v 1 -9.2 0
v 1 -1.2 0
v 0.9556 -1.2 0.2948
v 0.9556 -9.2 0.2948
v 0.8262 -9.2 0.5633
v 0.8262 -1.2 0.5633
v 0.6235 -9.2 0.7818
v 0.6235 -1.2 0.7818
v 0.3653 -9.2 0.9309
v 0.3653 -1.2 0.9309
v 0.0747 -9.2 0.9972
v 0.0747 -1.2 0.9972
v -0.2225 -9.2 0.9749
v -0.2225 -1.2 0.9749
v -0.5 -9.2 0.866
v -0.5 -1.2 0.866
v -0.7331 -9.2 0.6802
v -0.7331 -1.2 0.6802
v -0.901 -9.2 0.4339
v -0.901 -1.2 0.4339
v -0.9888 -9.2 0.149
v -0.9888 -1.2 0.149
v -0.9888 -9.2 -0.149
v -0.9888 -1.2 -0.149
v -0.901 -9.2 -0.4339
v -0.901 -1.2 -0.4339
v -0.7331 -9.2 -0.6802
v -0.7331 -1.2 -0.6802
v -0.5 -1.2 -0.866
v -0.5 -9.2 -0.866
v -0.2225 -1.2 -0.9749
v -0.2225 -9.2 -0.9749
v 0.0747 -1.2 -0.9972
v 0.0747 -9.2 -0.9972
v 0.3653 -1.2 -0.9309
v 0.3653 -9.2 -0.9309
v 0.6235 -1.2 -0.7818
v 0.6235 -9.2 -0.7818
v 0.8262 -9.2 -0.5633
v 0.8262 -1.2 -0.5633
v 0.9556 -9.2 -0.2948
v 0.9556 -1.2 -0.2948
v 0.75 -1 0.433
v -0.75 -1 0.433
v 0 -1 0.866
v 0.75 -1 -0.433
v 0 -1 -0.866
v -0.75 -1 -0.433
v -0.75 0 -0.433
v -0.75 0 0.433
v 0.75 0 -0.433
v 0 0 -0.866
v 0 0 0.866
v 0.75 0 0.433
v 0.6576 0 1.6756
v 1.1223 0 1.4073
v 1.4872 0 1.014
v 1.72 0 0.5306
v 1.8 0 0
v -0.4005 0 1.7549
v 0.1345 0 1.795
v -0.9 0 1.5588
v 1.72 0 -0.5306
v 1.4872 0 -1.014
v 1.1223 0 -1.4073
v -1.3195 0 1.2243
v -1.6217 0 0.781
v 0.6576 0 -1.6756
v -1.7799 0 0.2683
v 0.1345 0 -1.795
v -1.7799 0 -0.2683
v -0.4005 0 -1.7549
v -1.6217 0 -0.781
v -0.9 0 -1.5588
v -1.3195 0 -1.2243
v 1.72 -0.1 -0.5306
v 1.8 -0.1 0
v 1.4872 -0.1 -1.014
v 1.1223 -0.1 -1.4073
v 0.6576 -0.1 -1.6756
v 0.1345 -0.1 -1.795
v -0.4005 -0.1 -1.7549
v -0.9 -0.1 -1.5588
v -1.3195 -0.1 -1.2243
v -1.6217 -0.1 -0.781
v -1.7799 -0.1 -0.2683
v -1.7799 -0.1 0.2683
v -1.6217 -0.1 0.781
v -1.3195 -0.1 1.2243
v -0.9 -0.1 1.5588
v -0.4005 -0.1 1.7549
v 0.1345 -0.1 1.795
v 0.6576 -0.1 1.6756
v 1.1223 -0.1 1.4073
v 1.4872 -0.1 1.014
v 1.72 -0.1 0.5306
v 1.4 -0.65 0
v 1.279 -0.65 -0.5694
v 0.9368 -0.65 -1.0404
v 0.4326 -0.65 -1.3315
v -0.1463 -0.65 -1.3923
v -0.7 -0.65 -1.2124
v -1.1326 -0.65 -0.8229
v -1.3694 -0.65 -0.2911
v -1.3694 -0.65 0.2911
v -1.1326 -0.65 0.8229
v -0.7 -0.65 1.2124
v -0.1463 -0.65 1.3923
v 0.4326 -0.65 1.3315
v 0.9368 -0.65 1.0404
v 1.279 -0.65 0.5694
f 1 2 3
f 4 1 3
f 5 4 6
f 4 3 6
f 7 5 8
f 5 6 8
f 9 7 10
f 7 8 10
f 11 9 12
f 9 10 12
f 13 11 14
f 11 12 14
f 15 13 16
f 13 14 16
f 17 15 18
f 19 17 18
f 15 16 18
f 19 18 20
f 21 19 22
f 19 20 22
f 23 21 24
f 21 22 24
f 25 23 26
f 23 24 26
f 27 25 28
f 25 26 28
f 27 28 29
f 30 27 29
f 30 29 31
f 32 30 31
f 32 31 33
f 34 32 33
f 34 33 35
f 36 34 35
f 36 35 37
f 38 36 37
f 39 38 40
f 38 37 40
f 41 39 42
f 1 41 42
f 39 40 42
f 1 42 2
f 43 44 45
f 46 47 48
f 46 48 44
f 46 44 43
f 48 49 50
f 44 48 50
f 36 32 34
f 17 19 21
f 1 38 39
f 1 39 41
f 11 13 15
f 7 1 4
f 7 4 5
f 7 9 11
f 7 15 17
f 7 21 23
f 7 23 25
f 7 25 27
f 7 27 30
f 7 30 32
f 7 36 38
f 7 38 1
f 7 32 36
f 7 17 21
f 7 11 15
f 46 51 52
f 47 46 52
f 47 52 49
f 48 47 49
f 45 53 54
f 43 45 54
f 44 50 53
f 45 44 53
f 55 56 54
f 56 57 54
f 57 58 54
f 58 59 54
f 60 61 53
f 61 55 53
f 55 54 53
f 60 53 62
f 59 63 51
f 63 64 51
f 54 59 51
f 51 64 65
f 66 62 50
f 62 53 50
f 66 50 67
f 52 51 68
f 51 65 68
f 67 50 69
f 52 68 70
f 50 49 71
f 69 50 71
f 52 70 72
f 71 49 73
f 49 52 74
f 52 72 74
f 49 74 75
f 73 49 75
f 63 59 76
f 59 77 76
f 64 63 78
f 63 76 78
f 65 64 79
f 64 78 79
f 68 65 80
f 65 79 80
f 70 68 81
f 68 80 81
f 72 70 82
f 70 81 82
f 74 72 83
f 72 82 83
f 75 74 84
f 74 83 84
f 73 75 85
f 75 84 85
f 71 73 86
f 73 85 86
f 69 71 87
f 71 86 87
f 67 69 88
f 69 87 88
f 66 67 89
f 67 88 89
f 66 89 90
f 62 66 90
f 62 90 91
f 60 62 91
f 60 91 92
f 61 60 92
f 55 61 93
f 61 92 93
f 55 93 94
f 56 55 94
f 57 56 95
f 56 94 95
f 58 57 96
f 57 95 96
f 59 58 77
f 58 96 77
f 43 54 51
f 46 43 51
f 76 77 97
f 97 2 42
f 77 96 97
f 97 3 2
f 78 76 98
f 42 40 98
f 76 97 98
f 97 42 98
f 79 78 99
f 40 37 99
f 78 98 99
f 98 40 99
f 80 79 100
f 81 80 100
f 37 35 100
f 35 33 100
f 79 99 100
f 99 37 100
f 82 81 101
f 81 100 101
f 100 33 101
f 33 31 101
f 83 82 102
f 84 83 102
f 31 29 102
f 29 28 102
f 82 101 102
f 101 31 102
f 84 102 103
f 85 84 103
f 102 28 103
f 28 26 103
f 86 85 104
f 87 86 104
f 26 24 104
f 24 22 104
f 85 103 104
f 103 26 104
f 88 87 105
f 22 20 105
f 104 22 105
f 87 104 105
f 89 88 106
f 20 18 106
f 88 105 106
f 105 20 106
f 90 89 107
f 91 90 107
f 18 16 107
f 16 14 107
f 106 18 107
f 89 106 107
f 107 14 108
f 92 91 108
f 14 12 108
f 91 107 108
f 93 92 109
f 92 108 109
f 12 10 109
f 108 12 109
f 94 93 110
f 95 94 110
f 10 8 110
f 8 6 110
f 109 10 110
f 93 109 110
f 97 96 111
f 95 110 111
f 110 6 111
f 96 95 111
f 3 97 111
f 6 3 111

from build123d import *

# Parameters (mm, degrees)
CUT_EXTRUDE_1_DEPTH = 1
SKETCH_3_R          = 1
EXTRUDE_2_DEPTH     = 8


with BuildPart() as part:
    # 草图1 → 旋转1 (revolve)
    with BuildSketch(Plane.XY):
        Polygon((0, -1.2), (0, 0), (1.8, 0), (1.8, -0.1), (1, -1.2), align=None)
    revolve(axis=Axis((0, 0, 0), (0, 1, 0)))

    # 草图2 → 切除-拉伸1 (cut)
    with BuildSketch(Plane(origin=(0, 0, 0), x_dir=(1, 0, 0), z_dir=(0, 1, 0))):
        Polygon((0, -0.866025404), (0.75, -0.433012702), (0.75, 0.433012702), (0, 0.866025404), (-0.75, 0.433012702), (-0.75, -0.433012702), align=None)
    extrude(amount=-CUT_EXTRUDE_1_DEPTH, mode=Mode.SUBTRACT)

    # 草图3 → 凸台-拉伸2 (add)
    with BuildSketch(Plane.XZ.offset(1.2)):
        Circle(SKETCH_3_R)
    extrude(amount=EXTRUDE_2_DEPTH)


solid = part.part
